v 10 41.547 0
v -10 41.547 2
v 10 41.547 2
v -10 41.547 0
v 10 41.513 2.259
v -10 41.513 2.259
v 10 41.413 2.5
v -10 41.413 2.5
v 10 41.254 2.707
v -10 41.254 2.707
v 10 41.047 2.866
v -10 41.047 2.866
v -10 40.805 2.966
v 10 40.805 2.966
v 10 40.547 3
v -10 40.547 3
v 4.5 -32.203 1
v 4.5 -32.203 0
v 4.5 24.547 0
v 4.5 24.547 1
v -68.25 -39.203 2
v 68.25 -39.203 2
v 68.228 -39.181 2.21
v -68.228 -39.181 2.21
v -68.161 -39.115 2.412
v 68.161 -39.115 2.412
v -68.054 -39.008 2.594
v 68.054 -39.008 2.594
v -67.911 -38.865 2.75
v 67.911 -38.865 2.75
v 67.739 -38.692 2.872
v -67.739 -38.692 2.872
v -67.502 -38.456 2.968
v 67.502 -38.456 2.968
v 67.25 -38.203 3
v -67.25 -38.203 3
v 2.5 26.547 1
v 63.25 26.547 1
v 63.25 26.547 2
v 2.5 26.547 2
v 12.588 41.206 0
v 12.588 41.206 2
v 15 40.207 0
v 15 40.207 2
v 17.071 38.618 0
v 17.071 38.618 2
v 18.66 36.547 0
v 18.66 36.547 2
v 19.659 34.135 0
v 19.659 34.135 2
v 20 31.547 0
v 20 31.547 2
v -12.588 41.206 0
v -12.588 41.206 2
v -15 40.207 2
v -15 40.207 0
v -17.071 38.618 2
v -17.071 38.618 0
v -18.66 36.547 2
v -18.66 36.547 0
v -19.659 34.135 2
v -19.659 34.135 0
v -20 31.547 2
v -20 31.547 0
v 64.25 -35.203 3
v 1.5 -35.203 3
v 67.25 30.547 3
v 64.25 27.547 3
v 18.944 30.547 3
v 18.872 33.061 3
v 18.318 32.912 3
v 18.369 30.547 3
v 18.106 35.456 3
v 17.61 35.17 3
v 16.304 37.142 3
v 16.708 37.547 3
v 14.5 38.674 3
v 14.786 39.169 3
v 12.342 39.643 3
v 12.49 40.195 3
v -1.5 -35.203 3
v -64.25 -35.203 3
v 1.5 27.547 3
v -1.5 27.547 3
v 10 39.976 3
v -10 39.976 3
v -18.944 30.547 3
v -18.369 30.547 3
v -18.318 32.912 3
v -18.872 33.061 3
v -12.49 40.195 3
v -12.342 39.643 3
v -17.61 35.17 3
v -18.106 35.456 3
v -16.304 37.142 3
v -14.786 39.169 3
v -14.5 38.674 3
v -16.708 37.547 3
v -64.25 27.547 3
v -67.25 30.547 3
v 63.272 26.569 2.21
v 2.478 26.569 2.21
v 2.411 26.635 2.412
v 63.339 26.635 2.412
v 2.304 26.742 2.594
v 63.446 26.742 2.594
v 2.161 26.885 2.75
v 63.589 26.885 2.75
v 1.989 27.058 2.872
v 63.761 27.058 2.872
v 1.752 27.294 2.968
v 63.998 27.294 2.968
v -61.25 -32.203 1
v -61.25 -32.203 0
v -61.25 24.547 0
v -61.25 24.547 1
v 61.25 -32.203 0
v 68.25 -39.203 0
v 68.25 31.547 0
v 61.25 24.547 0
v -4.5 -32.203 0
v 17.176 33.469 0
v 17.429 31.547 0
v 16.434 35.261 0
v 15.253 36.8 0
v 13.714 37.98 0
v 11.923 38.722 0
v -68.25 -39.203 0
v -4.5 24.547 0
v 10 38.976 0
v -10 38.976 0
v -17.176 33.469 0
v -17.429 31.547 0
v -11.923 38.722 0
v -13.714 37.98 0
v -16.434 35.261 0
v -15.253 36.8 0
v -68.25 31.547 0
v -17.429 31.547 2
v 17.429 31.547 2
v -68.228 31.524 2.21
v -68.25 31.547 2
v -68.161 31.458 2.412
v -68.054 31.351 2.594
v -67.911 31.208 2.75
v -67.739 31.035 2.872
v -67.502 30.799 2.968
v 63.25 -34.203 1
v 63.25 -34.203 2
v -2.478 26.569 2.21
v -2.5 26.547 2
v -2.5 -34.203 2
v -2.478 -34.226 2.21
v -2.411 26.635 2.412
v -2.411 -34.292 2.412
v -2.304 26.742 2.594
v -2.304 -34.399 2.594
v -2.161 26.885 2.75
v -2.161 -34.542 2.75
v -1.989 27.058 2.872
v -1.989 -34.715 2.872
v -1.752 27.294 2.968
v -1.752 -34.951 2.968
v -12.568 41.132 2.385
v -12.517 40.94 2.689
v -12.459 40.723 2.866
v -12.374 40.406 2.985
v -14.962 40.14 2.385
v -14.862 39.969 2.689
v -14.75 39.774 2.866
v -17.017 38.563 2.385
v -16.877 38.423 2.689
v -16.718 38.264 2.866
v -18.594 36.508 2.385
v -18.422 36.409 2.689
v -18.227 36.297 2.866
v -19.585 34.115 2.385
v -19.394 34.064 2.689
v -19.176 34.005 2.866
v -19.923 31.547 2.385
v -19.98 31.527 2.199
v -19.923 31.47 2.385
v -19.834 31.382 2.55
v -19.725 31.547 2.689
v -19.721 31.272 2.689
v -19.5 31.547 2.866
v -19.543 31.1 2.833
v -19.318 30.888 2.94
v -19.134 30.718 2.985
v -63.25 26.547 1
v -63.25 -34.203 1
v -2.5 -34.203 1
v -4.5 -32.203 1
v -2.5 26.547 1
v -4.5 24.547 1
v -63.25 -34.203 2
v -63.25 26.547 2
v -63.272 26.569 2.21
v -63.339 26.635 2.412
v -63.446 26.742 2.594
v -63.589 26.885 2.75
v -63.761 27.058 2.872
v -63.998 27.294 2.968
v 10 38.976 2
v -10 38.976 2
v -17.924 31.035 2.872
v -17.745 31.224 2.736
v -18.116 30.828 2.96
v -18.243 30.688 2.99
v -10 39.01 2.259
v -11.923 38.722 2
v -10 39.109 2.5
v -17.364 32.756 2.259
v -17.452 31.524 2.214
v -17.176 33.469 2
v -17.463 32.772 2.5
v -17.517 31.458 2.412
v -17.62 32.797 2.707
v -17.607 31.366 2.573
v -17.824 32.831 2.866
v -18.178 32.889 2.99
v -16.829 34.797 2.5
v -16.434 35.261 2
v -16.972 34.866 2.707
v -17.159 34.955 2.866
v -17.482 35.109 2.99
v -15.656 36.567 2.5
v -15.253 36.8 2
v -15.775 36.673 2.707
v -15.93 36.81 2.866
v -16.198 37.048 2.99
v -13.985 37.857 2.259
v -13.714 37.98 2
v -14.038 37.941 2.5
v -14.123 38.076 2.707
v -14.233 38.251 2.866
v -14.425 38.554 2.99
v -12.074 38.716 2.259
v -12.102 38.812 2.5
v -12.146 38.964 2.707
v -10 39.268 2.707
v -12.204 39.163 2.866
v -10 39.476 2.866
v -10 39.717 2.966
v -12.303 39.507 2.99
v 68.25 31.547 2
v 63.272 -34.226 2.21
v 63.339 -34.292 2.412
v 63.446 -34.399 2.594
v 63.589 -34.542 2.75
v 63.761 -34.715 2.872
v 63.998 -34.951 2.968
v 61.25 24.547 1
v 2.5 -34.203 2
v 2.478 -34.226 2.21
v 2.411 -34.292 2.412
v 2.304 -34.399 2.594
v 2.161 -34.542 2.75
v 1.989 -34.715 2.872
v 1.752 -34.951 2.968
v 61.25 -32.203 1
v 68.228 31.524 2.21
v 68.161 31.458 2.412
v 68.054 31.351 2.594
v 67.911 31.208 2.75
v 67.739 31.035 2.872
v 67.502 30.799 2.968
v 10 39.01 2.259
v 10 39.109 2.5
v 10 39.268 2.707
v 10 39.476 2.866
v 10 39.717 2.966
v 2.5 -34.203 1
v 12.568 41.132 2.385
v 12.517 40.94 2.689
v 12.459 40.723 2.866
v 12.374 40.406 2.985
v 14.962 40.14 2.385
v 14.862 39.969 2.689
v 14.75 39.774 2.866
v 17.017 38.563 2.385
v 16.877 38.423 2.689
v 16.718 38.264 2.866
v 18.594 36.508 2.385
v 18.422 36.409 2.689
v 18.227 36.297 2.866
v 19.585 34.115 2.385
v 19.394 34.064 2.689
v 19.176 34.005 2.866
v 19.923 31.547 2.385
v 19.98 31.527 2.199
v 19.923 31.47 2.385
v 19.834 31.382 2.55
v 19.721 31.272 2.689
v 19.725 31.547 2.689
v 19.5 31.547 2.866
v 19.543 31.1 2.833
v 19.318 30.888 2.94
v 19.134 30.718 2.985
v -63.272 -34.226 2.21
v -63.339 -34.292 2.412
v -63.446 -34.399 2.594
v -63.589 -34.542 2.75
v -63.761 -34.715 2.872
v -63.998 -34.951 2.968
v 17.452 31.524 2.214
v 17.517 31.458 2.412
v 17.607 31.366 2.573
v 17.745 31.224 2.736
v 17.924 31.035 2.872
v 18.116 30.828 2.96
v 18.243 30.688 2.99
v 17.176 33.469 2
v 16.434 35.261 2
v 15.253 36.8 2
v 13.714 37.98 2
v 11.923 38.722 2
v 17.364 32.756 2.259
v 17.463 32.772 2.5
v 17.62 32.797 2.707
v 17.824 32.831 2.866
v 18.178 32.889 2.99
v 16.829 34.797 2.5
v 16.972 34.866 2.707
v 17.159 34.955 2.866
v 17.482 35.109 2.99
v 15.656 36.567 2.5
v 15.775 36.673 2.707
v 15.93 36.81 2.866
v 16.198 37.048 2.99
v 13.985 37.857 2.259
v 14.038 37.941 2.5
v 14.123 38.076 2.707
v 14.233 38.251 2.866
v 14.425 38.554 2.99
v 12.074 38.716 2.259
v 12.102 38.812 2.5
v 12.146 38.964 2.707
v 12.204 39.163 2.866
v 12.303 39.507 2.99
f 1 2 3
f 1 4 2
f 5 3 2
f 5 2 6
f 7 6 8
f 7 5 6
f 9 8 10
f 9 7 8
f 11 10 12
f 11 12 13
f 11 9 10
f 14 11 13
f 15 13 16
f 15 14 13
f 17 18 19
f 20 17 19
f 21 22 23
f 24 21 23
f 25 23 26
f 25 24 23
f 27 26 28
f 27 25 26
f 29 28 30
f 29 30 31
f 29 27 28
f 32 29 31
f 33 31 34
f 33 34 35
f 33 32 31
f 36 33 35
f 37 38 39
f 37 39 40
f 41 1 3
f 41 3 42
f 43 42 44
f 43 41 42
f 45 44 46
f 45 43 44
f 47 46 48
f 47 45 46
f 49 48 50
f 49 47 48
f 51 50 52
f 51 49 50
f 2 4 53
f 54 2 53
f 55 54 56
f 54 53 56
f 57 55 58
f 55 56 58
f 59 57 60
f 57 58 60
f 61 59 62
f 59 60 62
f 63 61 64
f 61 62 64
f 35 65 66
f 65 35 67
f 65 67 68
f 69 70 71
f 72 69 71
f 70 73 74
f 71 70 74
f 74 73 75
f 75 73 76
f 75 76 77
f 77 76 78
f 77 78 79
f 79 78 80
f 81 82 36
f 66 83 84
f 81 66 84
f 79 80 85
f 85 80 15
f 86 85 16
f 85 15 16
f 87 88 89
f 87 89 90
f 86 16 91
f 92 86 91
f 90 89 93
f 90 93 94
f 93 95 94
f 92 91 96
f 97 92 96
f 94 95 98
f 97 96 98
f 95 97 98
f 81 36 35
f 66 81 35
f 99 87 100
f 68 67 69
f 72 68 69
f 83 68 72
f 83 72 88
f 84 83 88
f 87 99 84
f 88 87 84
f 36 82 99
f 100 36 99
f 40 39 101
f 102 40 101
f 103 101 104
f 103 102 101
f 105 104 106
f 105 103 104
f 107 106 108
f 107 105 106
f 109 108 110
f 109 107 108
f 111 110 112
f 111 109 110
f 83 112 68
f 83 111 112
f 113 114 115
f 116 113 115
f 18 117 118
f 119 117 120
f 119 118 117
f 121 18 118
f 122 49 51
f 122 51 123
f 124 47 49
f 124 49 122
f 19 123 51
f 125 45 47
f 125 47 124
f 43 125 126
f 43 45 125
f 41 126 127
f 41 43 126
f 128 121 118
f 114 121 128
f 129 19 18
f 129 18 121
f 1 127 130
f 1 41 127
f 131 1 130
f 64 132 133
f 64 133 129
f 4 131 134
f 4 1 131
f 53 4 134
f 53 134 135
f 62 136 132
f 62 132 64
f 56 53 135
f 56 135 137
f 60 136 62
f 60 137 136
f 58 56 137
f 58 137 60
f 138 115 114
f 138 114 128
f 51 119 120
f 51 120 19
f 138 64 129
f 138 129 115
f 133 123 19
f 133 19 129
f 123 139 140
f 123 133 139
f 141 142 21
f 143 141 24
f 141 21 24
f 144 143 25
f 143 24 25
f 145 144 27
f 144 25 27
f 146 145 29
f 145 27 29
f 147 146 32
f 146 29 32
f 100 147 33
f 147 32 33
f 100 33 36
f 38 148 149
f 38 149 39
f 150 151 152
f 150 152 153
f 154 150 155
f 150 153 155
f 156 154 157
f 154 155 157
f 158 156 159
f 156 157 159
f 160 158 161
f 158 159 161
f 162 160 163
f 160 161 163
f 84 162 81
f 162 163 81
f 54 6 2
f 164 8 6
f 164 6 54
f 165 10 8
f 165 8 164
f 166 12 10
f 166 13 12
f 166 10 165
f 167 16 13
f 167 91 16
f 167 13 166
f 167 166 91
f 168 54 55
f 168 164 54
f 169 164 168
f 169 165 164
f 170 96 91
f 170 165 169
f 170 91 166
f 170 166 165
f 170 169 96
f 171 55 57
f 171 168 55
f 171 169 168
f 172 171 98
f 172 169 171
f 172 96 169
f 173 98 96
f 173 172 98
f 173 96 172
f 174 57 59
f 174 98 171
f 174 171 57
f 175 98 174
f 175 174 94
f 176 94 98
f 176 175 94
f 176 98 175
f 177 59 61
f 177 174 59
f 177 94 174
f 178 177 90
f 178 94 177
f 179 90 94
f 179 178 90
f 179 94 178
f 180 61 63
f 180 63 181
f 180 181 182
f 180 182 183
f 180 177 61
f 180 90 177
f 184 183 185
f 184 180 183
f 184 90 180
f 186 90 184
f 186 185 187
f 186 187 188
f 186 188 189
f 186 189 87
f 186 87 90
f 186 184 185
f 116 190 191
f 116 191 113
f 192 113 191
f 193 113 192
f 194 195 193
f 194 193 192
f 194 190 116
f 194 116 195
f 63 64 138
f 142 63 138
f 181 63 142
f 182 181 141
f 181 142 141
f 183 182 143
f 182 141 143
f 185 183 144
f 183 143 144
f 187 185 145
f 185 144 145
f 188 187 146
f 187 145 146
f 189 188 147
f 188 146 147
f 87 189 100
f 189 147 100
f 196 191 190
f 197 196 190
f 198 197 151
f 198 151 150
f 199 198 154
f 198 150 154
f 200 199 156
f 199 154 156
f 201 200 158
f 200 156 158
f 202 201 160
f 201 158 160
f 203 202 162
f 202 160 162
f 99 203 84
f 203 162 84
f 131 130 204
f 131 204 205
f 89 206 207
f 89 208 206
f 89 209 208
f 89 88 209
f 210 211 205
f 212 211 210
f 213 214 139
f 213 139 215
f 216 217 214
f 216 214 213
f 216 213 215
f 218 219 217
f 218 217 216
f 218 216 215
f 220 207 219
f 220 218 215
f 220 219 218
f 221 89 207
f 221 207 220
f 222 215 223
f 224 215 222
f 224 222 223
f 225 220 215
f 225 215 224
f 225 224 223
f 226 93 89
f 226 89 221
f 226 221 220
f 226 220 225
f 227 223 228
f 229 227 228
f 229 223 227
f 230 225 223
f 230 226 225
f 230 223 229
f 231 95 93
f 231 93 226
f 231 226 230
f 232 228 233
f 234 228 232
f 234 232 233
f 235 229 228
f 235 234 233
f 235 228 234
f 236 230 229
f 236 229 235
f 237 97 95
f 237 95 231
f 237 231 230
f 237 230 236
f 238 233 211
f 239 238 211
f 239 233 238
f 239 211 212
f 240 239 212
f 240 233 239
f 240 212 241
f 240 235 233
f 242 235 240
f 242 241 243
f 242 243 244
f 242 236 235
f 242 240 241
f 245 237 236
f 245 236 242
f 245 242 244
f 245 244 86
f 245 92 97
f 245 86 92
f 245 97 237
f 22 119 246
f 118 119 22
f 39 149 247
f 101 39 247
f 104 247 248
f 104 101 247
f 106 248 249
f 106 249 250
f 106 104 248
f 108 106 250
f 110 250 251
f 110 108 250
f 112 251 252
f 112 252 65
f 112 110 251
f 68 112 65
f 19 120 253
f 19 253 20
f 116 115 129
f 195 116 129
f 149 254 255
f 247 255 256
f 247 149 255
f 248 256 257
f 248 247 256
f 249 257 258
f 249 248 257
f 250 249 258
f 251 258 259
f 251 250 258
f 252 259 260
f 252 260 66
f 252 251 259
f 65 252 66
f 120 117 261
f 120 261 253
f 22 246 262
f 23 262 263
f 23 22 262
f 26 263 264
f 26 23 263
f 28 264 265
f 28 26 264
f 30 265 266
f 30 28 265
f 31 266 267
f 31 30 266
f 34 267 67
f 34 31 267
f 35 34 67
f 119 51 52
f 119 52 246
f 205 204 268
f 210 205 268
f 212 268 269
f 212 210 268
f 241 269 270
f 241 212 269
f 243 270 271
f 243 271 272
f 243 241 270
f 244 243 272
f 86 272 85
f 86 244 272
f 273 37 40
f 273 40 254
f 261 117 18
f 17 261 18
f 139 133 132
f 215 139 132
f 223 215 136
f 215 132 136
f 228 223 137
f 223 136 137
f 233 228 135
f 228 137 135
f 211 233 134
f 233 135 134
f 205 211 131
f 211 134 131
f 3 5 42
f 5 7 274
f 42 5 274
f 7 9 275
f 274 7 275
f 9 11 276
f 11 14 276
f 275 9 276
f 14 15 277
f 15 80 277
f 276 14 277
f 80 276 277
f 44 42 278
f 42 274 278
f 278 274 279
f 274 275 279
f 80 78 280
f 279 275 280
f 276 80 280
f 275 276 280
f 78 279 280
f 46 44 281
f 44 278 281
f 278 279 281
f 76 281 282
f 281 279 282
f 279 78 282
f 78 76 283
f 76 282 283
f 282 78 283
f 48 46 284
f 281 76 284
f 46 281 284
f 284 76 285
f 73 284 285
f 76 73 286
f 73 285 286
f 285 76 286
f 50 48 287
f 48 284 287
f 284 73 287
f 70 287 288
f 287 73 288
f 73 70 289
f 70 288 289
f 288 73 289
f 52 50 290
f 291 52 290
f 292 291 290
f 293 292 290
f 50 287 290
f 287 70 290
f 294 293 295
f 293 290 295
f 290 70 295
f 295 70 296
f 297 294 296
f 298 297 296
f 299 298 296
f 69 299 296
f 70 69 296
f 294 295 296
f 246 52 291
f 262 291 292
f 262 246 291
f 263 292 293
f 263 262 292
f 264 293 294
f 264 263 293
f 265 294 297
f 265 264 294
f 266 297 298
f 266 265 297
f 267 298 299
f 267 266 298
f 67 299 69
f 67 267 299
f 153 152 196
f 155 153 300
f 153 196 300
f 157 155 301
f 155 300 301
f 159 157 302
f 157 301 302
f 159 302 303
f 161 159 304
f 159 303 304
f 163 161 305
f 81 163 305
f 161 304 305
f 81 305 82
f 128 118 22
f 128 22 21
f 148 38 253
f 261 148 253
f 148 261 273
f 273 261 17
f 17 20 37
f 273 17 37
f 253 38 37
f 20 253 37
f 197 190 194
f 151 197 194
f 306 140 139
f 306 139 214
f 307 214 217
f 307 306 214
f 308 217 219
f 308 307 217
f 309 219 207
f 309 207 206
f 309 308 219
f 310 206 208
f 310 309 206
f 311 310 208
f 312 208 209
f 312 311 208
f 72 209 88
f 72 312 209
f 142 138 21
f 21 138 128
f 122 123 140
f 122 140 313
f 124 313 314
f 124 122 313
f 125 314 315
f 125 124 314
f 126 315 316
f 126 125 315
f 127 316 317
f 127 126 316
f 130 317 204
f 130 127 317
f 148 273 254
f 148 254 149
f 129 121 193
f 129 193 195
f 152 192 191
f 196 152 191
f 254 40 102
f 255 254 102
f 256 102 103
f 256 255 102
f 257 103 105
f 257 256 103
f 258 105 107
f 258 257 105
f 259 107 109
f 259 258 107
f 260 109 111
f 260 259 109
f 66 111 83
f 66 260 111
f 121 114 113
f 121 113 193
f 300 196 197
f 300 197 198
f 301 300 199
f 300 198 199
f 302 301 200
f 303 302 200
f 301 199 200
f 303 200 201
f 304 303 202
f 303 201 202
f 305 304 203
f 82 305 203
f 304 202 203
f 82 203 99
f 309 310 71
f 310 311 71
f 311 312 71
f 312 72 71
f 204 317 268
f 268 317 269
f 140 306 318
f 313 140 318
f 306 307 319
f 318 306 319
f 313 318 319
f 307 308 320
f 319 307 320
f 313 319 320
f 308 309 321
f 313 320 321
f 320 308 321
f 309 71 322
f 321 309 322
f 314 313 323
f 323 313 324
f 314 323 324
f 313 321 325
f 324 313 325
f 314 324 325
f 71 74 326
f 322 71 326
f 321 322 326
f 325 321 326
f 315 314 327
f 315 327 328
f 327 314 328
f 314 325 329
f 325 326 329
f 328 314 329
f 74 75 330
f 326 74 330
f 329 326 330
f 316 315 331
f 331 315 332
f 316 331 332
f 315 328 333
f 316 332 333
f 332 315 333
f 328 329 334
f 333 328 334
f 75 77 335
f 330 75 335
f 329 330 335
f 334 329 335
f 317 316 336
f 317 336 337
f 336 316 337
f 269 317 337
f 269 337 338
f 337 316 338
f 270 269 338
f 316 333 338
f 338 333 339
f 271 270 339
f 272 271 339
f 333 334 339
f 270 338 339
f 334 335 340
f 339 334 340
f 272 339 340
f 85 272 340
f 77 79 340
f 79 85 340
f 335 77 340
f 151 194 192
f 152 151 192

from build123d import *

# Parameters (mm, degrees)
F0_W     = 2.5711264648
F0_H     = 5
F1_DEPTH = 3
F0_W_2   = 56.75
F0_H_2   = 56.75
F2_DEPTH = 1
F3_R     = 1


# Not quite as in the source:
# - a feature names something its author has since deleted; it is built from what else it names


with BuildPart() as f1:
    # F0 (on Top) → F1 (new body)
    with BuildSketch(Plane.XY):
        Polygon((-63.25, -34.2033516131), (-63.25, 26.5466483869), (-20, 26.5466483869), (-20, 31.5466483869), (-34.125, 31.5466483869), (-68.25, 31.5466483869), (-68.25, -39.2033516131), (0, -39.2033516131), (0, 31.5466483869), (-17.4288735352, 31.5466483869), (-17.4288735352, 26.5466483869), (-2.5, 26.5466483869), (-2.5, -34.2033516131), align=None)
        with Locations((-18.7144367676, 29.0466483869)):
            Rectangle(F0_W, F0_H)
        with BuildLine():
            ThreePointArc((-10, 41.5466483869), (-17.0710678119, 38.6177161988), (-20, 31.5466483869))
            Line((-20, 31.5466483869), (-17.4288735352, 31.5466483869))
            ThreePointArc((-17.4288735352, 31.5466483869), (-15.2530068533, 36.7996552402), (-10, 38.9755219221))
            Line((-10, 38.9755219221), (0, 38.9755219221))
            Line((0, 38.9755219221), (0, 41.5466483869))
            Line((0, 41.5466483869), (-10, 41.5466483869))
        make_face()
    extrude(amount=F1_DEPTH)

    # F0 (on Top) → F2 (join)
    with BuildSketch(Plane.XY):
        Polygon((-20, 26.5466483869), (-63.25, 26.5466483869), (-63.25, -34.2033516131), (-2.5, -34.2033516131), (-2.5, 26.5466483869), (-17.4288735352, 26.5466483869), align=None)
        with Locations((-32.875, -3.8283516131)):
            Rectangle(F0_W_2, F0_H_2, mode=Mode.SUBTRACT)
    extrude(amount=F2_DEPTH)

    # F3
    f3_edges = [f1.edges().sort_by_distance(p)[0] for p in [
        (-32.875, 26.546648, 3),
        (-63.25, -3.828352, 3),
        (-32.875, -34.203352, 3),
        (-2.5, -3.828352, 3),
        (-68.25, -3.828352, 3),
        (-34.125, -39.203352, 3),
        (-8.714437, 31.546648, 3),
        (-15.253007, 36.799655, 3),
        (-17.071068, 38.617716, 3),
        (-5, 38.975522, 3),
        (-5, 41.546648, 3),
        (-44.125, 31.546648, 3),
    ]]
    fillet(f3_edges, radius=F3_R)

    # F4: F1 across plane


with BuildPart() as f1_1:
    add(f1.part)
    add(f1.part.mirror(Plane.YZ))


solid = f1_1.part
